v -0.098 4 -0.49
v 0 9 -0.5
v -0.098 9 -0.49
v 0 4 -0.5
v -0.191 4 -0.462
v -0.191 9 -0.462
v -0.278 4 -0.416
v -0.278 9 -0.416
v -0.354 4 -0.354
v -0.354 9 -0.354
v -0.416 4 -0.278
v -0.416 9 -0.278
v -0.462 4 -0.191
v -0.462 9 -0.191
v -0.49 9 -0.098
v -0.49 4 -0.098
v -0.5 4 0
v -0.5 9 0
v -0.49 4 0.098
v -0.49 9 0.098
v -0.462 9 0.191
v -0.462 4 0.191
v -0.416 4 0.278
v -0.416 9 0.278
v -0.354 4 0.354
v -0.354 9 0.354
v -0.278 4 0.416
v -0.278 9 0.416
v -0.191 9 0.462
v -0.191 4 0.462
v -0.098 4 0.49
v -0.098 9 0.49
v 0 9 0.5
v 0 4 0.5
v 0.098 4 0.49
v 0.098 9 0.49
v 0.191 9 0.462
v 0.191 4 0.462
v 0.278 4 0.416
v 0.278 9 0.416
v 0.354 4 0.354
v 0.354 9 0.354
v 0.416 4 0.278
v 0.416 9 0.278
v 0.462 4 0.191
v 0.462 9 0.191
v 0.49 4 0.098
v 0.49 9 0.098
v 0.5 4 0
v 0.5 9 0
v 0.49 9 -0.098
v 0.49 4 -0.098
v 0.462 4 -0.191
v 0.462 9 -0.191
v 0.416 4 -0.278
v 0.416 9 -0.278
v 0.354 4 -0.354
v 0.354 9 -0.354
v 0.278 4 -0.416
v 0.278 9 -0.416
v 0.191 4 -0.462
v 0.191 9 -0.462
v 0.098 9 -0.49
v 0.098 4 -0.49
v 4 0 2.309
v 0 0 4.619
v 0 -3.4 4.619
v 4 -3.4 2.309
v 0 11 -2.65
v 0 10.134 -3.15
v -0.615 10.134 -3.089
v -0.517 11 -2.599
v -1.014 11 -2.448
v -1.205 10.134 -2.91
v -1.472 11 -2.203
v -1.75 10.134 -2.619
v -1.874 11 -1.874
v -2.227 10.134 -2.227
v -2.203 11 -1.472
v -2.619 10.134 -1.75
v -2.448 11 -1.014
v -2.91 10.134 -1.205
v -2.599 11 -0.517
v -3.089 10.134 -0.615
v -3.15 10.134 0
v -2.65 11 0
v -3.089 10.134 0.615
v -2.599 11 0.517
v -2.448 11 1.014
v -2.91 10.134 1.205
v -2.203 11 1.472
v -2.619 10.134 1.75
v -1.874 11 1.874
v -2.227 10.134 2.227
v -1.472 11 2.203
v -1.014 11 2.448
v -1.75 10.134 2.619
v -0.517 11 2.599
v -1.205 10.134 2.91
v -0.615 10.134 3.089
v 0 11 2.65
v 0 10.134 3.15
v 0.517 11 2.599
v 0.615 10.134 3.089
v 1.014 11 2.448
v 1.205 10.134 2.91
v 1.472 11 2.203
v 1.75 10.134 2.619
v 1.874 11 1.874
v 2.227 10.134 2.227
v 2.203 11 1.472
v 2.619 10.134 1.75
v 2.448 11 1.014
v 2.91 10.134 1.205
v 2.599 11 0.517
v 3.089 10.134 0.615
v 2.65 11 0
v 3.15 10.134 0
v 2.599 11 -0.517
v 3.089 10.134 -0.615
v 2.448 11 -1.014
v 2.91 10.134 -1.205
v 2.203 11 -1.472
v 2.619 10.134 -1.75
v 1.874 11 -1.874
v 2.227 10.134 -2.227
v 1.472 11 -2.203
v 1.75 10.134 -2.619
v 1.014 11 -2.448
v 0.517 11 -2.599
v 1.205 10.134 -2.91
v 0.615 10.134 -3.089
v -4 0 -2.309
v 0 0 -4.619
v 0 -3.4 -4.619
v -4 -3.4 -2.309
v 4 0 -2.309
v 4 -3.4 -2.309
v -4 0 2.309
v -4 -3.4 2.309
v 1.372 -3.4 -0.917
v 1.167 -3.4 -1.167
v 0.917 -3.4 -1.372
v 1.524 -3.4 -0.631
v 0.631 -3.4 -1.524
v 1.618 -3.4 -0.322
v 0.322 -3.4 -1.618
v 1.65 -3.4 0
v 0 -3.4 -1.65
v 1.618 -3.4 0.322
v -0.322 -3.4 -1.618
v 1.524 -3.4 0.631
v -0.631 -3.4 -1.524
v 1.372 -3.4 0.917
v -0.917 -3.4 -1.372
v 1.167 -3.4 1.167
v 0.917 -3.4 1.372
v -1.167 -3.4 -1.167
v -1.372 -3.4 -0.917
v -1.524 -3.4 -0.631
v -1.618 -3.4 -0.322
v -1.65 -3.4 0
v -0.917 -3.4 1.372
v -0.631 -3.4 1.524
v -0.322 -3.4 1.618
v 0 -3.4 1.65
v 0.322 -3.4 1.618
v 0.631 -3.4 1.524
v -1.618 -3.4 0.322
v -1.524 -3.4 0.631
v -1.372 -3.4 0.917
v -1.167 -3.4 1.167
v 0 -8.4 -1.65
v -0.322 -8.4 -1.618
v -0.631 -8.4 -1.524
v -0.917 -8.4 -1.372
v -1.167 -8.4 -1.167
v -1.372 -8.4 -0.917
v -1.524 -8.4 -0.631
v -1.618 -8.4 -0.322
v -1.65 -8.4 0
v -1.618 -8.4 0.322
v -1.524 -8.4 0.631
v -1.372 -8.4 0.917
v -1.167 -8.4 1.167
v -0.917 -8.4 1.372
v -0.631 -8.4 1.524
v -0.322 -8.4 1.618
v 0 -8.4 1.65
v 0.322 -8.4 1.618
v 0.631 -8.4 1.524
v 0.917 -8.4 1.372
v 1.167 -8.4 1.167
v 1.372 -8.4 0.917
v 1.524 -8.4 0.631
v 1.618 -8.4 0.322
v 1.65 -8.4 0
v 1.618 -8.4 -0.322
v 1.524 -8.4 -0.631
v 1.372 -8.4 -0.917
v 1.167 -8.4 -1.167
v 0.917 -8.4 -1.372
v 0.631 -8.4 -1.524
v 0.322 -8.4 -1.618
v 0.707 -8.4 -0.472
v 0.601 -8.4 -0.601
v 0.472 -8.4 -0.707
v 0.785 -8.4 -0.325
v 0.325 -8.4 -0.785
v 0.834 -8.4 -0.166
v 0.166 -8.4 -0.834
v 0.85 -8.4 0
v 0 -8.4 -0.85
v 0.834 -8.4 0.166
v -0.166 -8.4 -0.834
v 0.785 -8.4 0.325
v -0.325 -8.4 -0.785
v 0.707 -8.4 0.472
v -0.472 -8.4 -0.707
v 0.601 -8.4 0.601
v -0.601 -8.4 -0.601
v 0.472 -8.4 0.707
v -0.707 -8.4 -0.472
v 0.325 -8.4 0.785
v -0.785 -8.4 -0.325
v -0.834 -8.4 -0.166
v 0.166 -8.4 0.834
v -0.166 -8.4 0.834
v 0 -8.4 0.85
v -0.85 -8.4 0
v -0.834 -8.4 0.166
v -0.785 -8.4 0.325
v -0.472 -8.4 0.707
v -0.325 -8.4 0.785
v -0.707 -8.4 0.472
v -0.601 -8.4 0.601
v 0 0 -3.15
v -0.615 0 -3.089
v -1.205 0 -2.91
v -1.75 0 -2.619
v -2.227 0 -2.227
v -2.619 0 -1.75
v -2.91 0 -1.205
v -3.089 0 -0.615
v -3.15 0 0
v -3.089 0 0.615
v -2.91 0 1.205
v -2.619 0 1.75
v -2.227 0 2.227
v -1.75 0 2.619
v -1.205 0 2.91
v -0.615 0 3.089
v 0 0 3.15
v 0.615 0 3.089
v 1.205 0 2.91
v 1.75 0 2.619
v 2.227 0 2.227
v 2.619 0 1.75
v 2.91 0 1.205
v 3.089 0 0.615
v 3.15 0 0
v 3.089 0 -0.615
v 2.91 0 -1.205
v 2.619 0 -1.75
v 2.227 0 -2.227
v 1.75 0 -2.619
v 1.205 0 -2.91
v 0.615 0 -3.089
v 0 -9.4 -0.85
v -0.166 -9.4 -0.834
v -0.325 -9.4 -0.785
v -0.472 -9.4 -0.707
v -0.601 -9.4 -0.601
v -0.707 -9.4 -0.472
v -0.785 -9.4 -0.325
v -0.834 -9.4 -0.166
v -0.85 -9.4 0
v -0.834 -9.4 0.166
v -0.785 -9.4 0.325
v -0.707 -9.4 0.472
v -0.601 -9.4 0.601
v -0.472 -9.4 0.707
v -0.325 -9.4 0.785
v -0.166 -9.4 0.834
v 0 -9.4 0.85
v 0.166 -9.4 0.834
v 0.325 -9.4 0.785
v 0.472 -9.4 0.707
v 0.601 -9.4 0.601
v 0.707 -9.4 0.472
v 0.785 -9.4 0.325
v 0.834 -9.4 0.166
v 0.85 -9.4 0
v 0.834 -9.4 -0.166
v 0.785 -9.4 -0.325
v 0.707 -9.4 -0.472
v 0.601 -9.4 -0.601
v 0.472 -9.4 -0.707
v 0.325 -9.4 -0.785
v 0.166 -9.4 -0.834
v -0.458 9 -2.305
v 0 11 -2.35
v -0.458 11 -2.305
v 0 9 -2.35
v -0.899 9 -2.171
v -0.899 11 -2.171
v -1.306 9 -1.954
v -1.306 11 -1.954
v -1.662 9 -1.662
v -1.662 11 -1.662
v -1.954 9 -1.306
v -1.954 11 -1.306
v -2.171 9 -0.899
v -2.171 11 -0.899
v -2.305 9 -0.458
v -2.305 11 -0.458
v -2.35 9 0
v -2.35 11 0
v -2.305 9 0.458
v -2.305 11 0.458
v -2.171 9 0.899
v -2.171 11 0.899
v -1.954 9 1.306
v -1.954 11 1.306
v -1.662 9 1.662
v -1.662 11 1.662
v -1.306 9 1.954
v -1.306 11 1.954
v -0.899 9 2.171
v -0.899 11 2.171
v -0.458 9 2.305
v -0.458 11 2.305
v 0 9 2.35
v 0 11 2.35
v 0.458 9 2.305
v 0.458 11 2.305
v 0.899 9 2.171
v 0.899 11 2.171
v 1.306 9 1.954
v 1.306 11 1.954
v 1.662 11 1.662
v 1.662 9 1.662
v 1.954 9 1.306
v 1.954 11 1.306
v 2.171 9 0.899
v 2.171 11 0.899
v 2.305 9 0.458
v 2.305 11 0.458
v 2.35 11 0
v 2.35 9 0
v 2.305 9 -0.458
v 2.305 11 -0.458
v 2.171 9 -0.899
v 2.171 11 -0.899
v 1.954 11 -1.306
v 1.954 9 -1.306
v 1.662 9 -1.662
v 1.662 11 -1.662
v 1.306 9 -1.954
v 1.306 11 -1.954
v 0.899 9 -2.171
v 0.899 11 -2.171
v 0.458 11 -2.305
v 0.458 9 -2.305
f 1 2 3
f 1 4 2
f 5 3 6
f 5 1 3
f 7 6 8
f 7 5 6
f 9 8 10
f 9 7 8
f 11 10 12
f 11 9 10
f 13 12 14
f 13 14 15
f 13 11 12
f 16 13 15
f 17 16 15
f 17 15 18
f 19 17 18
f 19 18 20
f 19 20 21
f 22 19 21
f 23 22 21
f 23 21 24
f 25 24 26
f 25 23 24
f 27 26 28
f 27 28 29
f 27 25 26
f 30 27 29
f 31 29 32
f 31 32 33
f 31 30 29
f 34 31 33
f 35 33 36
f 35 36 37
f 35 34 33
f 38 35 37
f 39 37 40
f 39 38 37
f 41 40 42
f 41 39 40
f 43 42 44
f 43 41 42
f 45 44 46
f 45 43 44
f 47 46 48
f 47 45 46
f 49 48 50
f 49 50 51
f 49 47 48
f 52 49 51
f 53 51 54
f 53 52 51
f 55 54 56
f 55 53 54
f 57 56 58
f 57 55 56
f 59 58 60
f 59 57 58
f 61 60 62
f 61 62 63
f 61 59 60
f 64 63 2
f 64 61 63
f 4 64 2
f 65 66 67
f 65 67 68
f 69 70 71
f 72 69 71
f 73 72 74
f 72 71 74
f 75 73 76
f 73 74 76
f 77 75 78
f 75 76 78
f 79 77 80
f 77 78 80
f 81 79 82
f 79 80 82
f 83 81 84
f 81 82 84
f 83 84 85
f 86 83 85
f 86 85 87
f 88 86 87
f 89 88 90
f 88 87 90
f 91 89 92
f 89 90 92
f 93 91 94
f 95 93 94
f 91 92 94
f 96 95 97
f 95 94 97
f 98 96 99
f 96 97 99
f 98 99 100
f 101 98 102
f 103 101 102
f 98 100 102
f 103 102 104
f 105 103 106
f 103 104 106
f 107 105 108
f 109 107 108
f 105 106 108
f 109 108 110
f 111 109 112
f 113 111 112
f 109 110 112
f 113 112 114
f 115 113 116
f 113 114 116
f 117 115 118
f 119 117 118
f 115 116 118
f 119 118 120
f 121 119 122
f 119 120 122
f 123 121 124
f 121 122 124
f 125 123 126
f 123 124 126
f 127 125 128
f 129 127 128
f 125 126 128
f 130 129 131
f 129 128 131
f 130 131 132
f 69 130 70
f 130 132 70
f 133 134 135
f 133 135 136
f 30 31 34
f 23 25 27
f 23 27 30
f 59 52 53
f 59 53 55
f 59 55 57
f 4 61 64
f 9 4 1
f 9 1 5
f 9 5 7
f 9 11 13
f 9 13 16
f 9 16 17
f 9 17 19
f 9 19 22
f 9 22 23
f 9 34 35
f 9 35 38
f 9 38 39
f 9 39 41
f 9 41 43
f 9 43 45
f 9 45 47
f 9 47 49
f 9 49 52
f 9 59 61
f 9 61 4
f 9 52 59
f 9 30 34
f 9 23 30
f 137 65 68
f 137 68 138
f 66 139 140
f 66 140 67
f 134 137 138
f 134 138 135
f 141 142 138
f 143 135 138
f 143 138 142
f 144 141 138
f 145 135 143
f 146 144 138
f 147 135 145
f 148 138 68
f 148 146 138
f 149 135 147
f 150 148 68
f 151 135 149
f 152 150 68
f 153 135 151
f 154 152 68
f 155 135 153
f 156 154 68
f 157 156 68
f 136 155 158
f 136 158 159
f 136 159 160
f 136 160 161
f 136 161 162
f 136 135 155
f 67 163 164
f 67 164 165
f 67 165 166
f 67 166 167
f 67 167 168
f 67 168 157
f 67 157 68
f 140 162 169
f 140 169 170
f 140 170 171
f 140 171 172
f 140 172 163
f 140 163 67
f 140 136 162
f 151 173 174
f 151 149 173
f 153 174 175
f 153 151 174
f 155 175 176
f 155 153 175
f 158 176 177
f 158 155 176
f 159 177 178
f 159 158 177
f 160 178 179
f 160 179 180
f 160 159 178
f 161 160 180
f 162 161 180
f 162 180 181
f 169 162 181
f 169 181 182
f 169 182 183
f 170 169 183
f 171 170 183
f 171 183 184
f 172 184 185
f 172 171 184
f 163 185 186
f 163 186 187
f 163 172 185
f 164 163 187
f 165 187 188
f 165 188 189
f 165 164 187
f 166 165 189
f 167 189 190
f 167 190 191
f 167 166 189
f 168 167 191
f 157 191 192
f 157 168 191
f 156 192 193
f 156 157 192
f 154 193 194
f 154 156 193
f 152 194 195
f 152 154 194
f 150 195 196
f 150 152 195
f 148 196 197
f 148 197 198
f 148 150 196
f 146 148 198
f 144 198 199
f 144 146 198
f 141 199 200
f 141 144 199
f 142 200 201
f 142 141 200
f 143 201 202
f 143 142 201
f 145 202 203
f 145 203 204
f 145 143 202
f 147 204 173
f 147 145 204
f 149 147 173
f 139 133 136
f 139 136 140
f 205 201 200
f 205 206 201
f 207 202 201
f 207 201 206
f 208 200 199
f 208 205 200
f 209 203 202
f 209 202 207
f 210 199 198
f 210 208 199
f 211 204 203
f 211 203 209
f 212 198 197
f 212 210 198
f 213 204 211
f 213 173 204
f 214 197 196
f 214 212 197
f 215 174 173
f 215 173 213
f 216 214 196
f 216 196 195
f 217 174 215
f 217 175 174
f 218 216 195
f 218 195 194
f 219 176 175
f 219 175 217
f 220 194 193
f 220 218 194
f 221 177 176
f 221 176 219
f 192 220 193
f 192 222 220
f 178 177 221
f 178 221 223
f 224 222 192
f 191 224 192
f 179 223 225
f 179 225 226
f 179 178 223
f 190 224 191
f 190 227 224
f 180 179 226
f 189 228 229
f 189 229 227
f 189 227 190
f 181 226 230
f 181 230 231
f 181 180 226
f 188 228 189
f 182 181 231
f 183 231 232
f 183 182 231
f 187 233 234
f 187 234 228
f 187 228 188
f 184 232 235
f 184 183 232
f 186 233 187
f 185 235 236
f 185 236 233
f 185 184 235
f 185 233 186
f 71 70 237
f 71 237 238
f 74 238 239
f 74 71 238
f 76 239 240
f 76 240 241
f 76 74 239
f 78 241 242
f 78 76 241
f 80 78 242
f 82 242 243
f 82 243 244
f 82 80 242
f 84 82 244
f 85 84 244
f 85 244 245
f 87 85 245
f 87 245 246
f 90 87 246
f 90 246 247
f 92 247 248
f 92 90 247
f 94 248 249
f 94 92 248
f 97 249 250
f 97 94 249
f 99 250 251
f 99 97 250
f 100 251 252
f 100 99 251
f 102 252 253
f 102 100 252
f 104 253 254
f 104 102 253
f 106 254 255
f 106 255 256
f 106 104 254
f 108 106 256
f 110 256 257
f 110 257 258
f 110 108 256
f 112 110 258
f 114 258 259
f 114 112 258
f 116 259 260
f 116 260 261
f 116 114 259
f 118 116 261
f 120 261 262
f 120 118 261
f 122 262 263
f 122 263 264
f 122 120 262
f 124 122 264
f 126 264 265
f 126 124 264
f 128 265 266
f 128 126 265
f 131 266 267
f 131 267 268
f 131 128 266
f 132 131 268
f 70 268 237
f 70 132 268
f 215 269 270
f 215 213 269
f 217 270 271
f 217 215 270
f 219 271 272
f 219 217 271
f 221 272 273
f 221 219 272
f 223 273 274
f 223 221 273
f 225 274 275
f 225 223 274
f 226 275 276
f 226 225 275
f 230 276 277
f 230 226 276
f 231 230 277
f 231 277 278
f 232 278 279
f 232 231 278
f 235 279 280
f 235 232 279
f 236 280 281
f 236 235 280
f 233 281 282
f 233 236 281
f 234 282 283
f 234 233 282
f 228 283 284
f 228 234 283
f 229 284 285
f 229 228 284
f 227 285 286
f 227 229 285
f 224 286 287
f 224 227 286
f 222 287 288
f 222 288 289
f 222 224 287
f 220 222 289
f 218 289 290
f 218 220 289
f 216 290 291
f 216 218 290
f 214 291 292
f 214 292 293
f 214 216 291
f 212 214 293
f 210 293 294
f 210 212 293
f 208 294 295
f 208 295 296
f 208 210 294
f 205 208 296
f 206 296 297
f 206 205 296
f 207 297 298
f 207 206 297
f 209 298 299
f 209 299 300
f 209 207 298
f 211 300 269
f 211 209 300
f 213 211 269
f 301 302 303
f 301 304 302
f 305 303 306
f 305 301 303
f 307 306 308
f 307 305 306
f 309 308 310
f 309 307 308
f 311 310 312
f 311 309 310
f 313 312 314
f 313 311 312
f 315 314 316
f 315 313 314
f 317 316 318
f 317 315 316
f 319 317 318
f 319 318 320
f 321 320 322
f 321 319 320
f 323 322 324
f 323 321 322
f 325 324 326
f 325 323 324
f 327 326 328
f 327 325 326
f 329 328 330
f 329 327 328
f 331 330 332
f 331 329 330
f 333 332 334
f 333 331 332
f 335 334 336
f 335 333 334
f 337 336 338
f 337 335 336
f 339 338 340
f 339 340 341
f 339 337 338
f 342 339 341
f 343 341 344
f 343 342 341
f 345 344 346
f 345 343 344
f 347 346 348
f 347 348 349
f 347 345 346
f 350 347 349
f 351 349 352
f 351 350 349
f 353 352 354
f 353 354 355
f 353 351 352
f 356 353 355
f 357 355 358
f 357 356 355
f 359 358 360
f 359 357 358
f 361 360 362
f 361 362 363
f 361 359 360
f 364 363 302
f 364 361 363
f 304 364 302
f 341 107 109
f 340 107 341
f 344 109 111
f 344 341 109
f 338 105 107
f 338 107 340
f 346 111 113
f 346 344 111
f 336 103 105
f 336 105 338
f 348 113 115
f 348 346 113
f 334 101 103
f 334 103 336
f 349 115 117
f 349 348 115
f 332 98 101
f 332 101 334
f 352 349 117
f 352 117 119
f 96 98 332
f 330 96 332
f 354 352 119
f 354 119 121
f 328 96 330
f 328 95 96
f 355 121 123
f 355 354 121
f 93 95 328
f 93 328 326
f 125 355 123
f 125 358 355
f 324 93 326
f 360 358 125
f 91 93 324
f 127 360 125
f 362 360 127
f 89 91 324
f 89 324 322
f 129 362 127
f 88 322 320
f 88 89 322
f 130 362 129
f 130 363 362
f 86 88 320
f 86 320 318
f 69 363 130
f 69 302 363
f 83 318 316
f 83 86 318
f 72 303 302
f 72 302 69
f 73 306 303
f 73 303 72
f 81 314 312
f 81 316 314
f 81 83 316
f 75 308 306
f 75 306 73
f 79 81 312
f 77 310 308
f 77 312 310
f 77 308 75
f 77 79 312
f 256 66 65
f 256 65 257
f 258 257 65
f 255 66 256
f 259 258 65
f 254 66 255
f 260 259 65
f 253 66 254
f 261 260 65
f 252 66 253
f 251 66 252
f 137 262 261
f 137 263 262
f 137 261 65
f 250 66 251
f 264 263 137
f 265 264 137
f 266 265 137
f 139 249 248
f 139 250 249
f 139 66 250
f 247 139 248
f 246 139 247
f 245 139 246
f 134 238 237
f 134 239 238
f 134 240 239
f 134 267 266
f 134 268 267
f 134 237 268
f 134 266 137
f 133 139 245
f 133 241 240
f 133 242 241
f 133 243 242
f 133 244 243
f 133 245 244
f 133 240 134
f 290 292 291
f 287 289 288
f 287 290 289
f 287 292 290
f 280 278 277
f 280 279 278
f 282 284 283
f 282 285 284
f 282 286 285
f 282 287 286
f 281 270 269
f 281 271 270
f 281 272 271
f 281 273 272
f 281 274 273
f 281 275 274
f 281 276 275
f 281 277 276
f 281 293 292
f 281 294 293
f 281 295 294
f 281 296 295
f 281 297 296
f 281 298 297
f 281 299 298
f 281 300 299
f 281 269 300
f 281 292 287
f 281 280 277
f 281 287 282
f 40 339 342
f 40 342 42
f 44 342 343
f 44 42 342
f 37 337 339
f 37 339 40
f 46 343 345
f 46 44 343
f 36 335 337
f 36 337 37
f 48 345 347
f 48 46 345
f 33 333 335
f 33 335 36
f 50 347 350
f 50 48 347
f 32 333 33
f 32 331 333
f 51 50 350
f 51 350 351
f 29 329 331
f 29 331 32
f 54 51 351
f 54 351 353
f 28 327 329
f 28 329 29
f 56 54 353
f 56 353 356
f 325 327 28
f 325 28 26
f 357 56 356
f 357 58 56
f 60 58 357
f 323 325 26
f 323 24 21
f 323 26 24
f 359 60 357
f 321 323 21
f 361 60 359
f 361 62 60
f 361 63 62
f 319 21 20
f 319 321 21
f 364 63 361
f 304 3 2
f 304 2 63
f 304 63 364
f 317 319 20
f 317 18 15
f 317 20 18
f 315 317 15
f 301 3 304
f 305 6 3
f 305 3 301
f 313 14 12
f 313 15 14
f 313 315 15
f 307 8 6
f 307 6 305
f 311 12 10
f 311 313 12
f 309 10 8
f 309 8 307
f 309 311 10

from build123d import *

# Parameters (mm, degrees)
CHAMFER_1_SIZE      = 0.5
CHAMFER_1_SIZE2     = 0.866025404
CUT_EXTRUDE_1_REACH = 15.077
SKETCH_2_R          = 5


with BuildPart() as part:
    # Эскиз1 → Повернуть1 (revolve)
    with BuildSketch(Plane.XY, mode=Mode.PRIVATE) as revolve_1_sk:
        Polygon((2.35, 11), (2.35, 9), (0.5, 9), (0.5, 4), (0, 4), (0, -9.4), (0.85, -9.4), (0.85, -8.4), (1.65, -8.4), (1.65, -3.4), (5, -3.4), (5, 0), (3.15, 0), (3.15, 11), align=None)
    revolve(revolve_1_sk.sketch.rotate(Axis((0, 0, 0), (0, 1, 0)), 90), axis=Axis((0, 0, 0), (0, 1, 0)))

    # Фаска1
    chamfer_1_edges = [part.edges().sort_by_distance(p)[0] for p in [
        (0, 11, 3.15),
    ]]
    chamfer_1_side = [part.faces().sort_by_distance(p)[0] for p in [
        (0, 11, 3.060904546),
    ]]
    chamfer(chamfer_1_edges, length=CHAMFER_1_SIZE, length2=CHAMFER_1_SIZE2, reference=chamfer_1_side[0])

    # Эскиз2 → Вырез-Вытянуть1 (cut, up to next)
    with BuildSketch(Plane(origin=(0, 0, 0), x_dir=(1, 0, 0), z_dir=(0, 1, 0)), mode=Mode.PRIVATE) as cut_extrude_1_sk1:
        Circle(SKETCH_2_R)
        Polygon((-4, 2.309401077), (-4, -2.309401077), (0, -4.618802154), (4, -2.309401077), (4, 2.309401077), (0, 4.618802154), align=None, mode=Mode.SUBTRACT)
    cut_extrude_1_tool1 = extrude(cut_extrude_1_sk1.sketch, amount=-CUT_EXTRUDE_1_REACH, mode=Mode.PRIVATE) & part.part
    add(cut_extrude_1_tool1.solids().sort_by_distance((-4.858579, 0, 0))[0], mode=Mode.SUBTRACT)


solid = part.part
